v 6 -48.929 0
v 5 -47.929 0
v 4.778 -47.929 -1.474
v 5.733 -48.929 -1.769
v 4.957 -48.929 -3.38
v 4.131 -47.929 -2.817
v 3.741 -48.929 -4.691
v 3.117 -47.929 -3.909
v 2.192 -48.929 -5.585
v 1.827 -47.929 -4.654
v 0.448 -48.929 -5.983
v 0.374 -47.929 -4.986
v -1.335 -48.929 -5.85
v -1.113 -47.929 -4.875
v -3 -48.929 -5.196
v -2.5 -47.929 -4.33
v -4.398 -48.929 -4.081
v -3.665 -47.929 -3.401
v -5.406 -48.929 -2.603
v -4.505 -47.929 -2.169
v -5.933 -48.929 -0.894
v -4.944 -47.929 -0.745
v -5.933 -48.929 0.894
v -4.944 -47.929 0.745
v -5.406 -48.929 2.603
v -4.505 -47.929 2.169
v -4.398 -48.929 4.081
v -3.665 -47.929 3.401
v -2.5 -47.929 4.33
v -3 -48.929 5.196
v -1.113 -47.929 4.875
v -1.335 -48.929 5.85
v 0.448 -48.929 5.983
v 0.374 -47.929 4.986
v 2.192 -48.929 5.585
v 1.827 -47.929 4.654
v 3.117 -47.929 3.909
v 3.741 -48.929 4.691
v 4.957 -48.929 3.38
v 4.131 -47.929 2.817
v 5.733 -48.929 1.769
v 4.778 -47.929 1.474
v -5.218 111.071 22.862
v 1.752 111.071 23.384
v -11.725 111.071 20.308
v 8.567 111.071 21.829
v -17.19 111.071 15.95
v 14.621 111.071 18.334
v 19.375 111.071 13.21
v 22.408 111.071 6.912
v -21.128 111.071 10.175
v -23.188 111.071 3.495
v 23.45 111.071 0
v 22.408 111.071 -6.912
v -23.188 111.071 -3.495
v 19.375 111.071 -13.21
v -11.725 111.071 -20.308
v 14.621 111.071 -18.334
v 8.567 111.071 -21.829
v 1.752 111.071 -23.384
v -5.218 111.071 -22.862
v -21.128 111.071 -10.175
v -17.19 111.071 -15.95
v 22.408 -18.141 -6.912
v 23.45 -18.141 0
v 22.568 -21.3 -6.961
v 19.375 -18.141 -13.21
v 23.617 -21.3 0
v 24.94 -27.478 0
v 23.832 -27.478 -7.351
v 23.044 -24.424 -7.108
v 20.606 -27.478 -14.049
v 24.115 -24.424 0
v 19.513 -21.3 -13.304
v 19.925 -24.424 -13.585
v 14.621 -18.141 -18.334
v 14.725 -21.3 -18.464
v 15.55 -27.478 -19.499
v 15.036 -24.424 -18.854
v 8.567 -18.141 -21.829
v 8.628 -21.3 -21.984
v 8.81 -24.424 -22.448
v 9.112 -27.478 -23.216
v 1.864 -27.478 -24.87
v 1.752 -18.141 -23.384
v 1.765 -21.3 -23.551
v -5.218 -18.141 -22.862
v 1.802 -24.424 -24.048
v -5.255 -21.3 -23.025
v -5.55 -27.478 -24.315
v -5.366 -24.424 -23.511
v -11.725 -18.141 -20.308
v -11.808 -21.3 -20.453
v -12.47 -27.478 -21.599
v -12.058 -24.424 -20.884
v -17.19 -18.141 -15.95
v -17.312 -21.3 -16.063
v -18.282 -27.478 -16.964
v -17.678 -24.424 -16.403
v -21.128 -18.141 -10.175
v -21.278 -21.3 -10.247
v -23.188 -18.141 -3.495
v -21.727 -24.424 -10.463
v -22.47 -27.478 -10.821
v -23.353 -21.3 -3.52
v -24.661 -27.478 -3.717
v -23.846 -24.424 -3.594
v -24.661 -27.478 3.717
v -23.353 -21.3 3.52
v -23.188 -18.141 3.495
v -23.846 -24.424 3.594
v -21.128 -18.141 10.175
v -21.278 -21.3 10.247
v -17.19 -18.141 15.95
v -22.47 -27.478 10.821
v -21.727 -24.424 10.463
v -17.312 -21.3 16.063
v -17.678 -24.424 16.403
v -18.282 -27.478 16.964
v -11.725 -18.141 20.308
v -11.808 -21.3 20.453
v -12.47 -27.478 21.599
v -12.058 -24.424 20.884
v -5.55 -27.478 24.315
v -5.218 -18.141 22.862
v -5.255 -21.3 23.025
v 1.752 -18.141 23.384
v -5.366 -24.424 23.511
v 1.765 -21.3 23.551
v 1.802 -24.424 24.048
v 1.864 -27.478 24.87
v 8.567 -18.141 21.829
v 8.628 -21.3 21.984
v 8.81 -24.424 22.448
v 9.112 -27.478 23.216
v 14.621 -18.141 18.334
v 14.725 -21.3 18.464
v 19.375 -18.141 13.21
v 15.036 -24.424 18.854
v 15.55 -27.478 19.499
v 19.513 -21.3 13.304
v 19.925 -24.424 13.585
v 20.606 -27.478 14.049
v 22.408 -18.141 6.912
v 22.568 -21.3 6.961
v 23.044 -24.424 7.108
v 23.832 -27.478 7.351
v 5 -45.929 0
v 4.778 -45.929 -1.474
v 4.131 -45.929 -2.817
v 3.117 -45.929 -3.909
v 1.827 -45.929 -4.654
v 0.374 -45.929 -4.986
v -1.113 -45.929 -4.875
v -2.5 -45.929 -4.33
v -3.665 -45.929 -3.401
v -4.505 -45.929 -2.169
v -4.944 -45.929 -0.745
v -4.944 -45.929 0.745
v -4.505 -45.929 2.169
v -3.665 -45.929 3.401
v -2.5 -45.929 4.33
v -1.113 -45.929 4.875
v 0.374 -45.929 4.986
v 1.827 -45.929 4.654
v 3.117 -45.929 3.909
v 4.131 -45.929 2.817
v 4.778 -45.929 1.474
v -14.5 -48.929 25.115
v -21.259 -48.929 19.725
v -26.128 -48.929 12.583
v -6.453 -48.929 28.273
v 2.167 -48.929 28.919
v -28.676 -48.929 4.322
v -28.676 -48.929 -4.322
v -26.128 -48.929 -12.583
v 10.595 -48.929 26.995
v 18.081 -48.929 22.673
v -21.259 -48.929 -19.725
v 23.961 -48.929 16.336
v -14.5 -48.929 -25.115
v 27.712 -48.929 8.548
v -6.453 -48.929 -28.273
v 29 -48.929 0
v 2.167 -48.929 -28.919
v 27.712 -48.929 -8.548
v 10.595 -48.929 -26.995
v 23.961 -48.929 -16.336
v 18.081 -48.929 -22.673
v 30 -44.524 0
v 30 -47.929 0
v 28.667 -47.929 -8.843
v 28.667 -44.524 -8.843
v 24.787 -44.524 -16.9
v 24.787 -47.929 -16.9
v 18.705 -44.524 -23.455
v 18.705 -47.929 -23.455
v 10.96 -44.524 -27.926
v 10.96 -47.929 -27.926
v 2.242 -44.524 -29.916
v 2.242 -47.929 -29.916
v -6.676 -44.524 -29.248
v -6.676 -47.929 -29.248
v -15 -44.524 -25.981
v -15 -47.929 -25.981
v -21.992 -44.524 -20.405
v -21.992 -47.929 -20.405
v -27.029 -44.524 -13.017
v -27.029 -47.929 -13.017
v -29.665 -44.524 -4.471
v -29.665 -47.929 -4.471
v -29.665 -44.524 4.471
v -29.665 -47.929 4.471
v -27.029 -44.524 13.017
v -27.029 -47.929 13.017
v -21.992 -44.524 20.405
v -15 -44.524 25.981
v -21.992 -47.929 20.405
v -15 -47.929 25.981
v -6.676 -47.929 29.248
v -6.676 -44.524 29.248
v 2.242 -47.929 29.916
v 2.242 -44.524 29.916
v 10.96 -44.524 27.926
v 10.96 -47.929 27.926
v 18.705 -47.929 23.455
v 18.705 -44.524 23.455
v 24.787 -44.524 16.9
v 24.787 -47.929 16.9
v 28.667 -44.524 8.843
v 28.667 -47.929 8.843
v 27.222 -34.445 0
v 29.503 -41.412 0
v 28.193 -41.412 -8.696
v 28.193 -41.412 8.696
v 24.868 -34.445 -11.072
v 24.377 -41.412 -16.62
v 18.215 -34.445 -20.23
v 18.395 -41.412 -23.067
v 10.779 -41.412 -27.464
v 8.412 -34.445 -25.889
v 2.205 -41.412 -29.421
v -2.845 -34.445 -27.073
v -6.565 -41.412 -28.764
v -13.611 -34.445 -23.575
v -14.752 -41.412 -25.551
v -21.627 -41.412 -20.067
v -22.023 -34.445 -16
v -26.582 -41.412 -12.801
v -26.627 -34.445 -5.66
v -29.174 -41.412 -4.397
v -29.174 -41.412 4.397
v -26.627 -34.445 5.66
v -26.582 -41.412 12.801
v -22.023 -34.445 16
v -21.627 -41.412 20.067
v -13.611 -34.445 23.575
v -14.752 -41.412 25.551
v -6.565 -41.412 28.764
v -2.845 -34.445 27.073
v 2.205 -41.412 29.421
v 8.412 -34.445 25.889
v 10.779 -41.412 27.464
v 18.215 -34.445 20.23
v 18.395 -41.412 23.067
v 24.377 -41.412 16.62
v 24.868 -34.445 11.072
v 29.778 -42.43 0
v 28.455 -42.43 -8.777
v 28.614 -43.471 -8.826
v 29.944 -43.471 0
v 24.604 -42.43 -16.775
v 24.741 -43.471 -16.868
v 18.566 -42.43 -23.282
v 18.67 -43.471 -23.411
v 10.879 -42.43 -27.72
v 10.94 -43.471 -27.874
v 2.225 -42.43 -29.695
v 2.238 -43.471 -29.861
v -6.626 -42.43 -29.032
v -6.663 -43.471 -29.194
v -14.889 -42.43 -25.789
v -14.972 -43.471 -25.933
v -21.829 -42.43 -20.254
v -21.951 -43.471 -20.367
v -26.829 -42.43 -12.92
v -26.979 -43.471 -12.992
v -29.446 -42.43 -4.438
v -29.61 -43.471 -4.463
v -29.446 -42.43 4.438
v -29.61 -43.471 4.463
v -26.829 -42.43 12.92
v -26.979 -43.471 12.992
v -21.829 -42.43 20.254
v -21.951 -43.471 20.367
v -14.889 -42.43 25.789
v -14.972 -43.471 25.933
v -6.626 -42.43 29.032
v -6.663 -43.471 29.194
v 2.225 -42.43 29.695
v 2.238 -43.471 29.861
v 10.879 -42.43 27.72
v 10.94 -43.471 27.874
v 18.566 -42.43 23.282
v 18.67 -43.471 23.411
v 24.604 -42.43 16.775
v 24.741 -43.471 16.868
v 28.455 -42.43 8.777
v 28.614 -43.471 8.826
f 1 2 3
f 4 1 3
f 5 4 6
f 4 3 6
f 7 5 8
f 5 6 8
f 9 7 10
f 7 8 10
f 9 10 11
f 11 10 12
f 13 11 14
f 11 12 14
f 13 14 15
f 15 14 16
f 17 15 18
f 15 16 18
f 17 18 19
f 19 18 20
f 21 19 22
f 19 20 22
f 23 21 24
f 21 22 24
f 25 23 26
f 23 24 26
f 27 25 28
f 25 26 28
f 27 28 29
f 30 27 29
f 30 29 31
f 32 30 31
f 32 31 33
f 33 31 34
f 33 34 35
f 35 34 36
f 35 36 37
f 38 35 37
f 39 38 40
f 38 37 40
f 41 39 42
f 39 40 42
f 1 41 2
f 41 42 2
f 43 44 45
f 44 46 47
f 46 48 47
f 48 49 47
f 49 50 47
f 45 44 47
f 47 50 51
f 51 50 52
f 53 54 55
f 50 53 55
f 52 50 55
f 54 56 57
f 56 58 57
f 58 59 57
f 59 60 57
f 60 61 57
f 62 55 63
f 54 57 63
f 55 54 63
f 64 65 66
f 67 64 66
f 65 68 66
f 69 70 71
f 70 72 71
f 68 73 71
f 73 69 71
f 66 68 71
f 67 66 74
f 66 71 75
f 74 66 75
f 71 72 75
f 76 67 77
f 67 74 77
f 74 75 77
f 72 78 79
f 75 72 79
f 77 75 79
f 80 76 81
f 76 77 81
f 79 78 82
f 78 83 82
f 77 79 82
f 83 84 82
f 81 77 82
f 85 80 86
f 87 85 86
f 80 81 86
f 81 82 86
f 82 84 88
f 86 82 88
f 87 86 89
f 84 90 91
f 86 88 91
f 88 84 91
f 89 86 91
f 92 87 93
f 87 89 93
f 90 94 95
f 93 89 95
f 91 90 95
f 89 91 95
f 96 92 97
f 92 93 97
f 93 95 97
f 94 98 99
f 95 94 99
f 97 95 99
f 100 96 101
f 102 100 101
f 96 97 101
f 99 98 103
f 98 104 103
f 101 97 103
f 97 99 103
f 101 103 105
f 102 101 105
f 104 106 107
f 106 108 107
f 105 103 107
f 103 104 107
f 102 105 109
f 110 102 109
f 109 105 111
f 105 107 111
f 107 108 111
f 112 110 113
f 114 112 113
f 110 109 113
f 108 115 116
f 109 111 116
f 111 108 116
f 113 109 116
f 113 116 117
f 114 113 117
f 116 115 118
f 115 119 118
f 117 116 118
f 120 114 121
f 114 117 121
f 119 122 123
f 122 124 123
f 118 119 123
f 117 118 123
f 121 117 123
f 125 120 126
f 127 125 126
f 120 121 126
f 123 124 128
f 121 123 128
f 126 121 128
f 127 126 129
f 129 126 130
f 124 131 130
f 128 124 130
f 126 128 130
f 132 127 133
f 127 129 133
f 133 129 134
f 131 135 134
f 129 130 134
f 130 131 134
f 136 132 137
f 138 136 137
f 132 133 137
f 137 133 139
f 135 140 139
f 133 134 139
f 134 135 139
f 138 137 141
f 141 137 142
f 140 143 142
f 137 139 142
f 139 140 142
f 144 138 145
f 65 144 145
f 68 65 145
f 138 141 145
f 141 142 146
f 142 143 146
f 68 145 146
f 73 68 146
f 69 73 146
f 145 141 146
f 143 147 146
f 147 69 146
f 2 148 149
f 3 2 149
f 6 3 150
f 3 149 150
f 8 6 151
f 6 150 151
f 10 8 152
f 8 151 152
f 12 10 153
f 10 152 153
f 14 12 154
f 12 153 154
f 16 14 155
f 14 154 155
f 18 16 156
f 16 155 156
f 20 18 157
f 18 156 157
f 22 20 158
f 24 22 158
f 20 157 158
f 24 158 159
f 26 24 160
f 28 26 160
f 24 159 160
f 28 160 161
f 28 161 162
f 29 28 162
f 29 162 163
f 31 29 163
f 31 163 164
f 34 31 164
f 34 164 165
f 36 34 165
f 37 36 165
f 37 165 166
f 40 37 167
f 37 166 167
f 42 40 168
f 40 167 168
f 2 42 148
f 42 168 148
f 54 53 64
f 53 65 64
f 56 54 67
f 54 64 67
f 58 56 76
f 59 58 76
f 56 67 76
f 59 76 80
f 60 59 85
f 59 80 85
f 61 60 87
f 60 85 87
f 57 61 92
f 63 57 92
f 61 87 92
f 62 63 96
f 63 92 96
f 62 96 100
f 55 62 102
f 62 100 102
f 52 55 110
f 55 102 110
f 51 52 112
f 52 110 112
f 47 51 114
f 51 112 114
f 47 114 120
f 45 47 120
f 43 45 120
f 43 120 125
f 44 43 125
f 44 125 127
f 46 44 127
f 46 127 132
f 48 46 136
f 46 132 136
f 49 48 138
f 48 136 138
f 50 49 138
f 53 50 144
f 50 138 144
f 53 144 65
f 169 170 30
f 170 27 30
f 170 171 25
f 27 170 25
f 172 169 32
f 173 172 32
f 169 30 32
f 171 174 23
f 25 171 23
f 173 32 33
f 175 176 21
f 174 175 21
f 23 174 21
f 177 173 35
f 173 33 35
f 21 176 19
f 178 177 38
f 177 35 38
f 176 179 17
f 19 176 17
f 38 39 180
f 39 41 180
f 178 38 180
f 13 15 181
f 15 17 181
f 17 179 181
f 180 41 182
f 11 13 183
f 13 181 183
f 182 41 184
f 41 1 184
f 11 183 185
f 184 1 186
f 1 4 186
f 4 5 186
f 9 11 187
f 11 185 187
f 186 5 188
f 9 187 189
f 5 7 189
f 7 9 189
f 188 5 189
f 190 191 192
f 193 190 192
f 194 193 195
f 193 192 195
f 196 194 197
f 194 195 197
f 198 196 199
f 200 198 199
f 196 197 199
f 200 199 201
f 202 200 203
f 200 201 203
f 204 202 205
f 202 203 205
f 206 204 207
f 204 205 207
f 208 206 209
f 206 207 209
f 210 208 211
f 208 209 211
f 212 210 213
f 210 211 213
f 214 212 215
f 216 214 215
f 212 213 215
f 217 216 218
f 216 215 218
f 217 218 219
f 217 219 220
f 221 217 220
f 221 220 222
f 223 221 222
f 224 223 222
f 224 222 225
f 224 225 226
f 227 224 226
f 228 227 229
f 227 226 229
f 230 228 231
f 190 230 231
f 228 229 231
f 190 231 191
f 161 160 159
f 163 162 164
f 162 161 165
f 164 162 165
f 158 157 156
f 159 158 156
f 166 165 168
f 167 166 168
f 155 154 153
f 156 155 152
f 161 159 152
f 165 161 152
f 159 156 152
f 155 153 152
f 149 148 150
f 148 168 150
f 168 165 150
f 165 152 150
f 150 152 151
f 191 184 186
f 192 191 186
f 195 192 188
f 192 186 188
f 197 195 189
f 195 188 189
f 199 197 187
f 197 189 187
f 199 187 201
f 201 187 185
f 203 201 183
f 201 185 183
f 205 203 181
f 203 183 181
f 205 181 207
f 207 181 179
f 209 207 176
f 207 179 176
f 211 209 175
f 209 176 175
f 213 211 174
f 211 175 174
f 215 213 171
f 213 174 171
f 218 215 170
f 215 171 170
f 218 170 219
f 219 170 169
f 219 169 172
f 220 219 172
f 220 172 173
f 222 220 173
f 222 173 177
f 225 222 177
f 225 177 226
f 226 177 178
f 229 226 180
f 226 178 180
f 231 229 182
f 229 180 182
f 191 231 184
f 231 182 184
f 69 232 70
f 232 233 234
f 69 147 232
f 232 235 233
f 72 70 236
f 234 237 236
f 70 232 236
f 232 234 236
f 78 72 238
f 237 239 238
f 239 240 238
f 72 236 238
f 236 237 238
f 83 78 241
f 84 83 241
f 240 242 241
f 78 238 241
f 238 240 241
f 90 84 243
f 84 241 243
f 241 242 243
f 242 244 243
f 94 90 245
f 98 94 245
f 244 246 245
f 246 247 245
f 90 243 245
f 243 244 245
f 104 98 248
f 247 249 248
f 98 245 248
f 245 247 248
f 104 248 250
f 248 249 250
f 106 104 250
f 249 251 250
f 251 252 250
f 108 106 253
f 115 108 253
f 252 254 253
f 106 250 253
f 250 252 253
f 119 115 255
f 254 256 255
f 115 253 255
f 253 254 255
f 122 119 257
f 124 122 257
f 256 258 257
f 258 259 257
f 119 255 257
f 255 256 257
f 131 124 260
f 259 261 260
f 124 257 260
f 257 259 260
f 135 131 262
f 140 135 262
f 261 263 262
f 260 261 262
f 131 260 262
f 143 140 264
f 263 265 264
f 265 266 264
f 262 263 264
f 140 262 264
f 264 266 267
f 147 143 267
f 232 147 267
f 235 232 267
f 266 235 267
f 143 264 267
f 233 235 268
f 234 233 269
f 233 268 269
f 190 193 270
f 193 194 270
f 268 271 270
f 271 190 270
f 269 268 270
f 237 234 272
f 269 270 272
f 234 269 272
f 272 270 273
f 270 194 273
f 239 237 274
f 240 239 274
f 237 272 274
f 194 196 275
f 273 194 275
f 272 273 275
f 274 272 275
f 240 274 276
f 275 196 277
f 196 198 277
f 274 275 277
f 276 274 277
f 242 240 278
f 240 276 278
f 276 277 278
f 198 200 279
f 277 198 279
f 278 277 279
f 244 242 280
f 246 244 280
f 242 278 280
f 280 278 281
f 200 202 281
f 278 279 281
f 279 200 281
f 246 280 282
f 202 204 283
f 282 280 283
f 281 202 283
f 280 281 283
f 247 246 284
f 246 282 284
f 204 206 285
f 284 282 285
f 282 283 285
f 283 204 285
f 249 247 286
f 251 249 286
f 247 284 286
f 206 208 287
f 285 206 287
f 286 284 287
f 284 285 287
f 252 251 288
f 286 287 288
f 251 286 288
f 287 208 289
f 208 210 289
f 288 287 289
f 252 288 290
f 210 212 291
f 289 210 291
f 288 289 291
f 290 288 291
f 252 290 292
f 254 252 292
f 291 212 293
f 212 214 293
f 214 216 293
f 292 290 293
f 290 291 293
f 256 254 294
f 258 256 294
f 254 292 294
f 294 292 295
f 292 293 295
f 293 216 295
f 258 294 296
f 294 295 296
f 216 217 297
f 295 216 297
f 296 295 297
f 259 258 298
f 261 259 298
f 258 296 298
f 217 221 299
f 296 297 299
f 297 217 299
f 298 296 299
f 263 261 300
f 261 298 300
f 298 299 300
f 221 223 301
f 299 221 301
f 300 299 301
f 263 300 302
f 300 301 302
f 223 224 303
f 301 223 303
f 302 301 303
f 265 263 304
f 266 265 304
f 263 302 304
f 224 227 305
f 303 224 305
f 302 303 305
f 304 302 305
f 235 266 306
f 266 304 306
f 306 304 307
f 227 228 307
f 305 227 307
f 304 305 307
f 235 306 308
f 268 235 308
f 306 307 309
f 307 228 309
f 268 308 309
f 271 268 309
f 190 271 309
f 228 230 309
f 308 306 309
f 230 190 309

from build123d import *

# Parameters (mm, degrees)
SFAZOWANIE1_SIZE = 1


with BuildPart() as part:
    # Szkic1 → Obrót1 (revolve)
    with BuildSketch(Plane.XY, mode=Mode.PRIVATE) as obr_t1_sk:
        with BuildLine():
            Line((0, 111.071464226), (-23.45, 111.071464226))
            Line((-23.45, 111.071464226), (-23.45, -18.141136369))
            ThreePointArc((-23.45, -18.141136369), (-23.824842317, -22.868718444), (-24.940002152, -27.478160664))
            Line((-24.940002152, -27.478160664), (-29.503332616, -41.411994143))
            ThreePointArc((-29.503332616, -41.411994143), (-29.875052561, -42.948474884), (-30, -44.524335575))
            Line((-30, -44.524335575), (-30, -48.928535774))
            Line((-30, -48.928535774), (-5, -48.928535774))
            Line((-5, -48.928535774), (-5, -45.928535774))
            Line((-5, -45.928535774), (0, -45.928535774))
            Line((0, -45.928535774), (0, 111.071464226))
        make_face()
    revolve(obr_t1_sk.sketch.rotate(Axis((0, -45.928535774, 0), (0, 1, 0)), 180), axis=Axis((0, -45.928535774, 0), (0, 1, 0)))

    # Sfazowanie1
    sfazowanie1_edges = [part.edges().sort_by_distance(p)[0] for p in [
        (-5, -48.928535774, 0),
        (-30, -48.928535774, 0),
    ]]
    chamfer(sfazowanie1_edges, length=SFAZOWANIE1_SIZE)


solid = part.part
